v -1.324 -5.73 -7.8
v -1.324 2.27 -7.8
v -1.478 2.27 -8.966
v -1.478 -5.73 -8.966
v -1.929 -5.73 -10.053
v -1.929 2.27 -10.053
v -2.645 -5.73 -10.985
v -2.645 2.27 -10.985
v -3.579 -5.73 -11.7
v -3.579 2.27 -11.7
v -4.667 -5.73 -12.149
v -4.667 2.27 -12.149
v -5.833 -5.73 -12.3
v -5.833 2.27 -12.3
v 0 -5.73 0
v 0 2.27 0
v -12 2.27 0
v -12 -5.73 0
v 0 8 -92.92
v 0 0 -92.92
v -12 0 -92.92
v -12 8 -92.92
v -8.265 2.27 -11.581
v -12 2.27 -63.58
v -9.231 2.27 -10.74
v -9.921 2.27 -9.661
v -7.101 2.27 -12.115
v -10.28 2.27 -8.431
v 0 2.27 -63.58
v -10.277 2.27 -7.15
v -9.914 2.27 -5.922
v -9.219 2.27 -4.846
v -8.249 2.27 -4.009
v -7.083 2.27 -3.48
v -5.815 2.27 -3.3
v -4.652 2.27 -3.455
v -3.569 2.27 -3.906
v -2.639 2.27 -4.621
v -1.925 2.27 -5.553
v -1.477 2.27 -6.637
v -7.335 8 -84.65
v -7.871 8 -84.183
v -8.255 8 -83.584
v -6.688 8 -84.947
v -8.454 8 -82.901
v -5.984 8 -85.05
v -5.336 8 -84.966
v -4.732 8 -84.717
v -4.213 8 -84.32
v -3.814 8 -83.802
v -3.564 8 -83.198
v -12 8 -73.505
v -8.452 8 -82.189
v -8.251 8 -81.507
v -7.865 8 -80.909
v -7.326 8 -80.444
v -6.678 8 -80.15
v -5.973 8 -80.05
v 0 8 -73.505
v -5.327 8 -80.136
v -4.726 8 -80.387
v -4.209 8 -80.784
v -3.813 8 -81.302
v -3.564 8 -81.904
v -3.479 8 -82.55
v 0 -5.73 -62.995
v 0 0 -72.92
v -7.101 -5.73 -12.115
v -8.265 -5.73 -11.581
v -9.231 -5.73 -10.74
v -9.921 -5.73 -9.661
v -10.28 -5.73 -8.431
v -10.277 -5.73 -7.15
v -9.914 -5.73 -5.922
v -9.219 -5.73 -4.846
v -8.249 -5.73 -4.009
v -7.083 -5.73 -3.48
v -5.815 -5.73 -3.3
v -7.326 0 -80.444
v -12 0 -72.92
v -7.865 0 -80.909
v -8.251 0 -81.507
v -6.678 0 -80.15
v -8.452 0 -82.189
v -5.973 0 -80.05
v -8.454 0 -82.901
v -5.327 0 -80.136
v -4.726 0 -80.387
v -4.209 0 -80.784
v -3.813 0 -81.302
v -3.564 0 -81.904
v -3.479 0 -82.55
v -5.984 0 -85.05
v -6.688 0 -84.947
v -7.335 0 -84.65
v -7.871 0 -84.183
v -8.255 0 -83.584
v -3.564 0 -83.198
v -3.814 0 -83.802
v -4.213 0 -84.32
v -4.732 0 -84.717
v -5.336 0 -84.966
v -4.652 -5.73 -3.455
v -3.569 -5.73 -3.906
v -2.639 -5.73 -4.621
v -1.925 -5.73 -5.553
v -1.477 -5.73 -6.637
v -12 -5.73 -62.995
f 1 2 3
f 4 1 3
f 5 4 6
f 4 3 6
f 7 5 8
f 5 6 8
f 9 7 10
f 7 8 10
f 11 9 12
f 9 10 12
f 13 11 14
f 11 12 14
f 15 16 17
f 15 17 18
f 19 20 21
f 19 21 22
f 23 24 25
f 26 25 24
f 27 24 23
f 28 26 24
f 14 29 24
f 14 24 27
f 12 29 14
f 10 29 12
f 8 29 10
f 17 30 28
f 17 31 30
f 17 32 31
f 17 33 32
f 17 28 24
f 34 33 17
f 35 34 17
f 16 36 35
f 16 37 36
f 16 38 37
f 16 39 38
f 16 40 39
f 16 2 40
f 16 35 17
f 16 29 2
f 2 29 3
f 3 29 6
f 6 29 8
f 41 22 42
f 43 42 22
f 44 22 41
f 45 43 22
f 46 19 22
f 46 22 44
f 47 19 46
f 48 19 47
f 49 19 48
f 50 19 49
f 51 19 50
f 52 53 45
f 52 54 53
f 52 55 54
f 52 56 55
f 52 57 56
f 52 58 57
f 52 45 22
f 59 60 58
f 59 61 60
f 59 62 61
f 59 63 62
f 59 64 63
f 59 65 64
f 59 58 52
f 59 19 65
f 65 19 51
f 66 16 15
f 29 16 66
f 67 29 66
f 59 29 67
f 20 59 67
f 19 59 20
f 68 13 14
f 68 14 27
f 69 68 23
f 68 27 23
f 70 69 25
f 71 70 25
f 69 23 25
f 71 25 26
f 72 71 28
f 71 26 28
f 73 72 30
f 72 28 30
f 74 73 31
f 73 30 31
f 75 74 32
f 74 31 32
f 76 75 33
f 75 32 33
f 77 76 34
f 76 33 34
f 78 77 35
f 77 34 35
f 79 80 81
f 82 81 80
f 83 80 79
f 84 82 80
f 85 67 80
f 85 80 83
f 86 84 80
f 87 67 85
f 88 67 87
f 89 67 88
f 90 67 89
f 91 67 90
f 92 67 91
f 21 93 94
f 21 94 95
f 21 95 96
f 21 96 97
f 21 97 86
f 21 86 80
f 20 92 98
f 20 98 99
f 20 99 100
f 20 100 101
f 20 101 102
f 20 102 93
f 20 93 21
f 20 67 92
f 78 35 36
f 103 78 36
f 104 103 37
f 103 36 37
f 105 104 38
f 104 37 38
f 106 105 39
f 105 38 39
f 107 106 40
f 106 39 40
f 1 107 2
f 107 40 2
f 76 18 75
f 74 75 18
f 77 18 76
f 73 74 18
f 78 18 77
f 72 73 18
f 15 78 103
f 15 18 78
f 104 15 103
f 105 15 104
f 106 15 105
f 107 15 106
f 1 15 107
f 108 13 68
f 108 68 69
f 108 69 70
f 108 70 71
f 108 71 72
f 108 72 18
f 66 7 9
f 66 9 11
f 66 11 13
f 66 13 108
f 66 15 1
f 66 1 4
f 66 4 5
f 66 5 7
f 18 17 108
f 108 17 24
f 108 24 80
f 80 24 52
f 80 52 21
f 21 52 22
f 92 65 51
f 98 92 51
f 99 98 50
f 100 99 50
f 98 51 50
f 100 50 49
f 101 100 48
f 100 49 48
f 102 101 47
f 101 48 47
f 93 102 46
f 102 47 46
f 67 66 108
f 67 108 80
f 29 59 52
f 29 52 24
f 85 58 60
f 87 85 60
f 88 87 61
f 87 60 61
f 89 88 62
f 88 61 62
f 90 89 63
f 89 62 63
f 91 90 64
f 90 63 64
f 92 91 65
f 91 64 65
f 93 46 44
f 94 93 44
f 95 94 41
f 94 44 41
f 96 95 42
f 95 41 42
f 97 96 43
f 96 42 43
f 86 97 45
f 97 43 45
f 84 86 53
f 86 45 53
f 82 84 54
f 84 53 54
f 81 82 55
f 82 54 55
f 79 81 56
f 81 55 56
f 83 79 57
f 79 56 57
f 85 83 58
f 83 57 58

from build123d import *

# Parameters (mm, degrees)
BOSS_EXTRUDE1_DEPTH = 12
CUT_EXTRUDE1_DEPTH  = 13.73


with BuildPart() as part:
    # Sketch1 → Boss-Extrude1 (new body)
    with BuildSketch(Plane(origin=(0, 0, 0), x_dir=(0, 0, -1), z_dir=(1, 0, 0))):
        Polygon((62.995348873, -5.73), (72.92, 0), (92.92, 0), (92.92, 3.314764861), (92.92, 8), (73.504568374, 8), (63.579917247, 2.27), (0, 2.27), (0, 0), (0, -5.73), (26.973026027, -5.73), align=None)
    extrude(amount=-BOSS_EXTRUDE1_DEPTH)

    # Sketch2 → Cut-Extrude1 (cut)
    with BuildSketch(Plane(origin=(0, 8, 0), x_dir=(1, 0, 0), z_dir=(0, 1, 0))):
        with BuildLine():
            ThreePointArc((-5.833418362, 12.299990394), (-10.32411062, 7.790701865), (-5.814822091, 3.300009606))
            Line((-5.814822091, 3.300009606), (-5.833418362, 12.299990394))
        make_face()
        with BuildLine():
            Line((-5.833418362, 12.299990394), (-5.814822091, 3.300009606))
            ThreePointArc((-5.814822091, 3.300009606), (-2.63885402, 4.621308572), (-1.324120226, 7.8))
            ThreePointArc((-1.324120226, 7.8), (-2.645428798, 10.985266206), (-5.833418362, 12.299990394))
        make_face()
        with BuildLine():
            ThreePointArc((-5.983738594, 85.0500168), (-8.478567627, 82.544856506), (-5.973407332, 80.050027474))
            Line((-5.973407332, 80.050027474), (-5.983738594, 85.0500168))
        make_face()
        with BuildLine():
            Line((-5.983738594, 85.0500168), (-5.973407332, 80.050027474))
            ThreePointArc((-5.973407332, 80.050027474), (-4.208980626, 80.784082455), (-3.478572963, 82.550022137))
            ThreePointArc((-3.478572963, 82.550022137), (-4.212633281, 84.319614474), (-5.983738594, 85.0500168))
        make_face()
    extrude(amount=-CUT_EXTRUDE1_DEPTH, mode=Mode.SUBTRACT)


solid = part.part
